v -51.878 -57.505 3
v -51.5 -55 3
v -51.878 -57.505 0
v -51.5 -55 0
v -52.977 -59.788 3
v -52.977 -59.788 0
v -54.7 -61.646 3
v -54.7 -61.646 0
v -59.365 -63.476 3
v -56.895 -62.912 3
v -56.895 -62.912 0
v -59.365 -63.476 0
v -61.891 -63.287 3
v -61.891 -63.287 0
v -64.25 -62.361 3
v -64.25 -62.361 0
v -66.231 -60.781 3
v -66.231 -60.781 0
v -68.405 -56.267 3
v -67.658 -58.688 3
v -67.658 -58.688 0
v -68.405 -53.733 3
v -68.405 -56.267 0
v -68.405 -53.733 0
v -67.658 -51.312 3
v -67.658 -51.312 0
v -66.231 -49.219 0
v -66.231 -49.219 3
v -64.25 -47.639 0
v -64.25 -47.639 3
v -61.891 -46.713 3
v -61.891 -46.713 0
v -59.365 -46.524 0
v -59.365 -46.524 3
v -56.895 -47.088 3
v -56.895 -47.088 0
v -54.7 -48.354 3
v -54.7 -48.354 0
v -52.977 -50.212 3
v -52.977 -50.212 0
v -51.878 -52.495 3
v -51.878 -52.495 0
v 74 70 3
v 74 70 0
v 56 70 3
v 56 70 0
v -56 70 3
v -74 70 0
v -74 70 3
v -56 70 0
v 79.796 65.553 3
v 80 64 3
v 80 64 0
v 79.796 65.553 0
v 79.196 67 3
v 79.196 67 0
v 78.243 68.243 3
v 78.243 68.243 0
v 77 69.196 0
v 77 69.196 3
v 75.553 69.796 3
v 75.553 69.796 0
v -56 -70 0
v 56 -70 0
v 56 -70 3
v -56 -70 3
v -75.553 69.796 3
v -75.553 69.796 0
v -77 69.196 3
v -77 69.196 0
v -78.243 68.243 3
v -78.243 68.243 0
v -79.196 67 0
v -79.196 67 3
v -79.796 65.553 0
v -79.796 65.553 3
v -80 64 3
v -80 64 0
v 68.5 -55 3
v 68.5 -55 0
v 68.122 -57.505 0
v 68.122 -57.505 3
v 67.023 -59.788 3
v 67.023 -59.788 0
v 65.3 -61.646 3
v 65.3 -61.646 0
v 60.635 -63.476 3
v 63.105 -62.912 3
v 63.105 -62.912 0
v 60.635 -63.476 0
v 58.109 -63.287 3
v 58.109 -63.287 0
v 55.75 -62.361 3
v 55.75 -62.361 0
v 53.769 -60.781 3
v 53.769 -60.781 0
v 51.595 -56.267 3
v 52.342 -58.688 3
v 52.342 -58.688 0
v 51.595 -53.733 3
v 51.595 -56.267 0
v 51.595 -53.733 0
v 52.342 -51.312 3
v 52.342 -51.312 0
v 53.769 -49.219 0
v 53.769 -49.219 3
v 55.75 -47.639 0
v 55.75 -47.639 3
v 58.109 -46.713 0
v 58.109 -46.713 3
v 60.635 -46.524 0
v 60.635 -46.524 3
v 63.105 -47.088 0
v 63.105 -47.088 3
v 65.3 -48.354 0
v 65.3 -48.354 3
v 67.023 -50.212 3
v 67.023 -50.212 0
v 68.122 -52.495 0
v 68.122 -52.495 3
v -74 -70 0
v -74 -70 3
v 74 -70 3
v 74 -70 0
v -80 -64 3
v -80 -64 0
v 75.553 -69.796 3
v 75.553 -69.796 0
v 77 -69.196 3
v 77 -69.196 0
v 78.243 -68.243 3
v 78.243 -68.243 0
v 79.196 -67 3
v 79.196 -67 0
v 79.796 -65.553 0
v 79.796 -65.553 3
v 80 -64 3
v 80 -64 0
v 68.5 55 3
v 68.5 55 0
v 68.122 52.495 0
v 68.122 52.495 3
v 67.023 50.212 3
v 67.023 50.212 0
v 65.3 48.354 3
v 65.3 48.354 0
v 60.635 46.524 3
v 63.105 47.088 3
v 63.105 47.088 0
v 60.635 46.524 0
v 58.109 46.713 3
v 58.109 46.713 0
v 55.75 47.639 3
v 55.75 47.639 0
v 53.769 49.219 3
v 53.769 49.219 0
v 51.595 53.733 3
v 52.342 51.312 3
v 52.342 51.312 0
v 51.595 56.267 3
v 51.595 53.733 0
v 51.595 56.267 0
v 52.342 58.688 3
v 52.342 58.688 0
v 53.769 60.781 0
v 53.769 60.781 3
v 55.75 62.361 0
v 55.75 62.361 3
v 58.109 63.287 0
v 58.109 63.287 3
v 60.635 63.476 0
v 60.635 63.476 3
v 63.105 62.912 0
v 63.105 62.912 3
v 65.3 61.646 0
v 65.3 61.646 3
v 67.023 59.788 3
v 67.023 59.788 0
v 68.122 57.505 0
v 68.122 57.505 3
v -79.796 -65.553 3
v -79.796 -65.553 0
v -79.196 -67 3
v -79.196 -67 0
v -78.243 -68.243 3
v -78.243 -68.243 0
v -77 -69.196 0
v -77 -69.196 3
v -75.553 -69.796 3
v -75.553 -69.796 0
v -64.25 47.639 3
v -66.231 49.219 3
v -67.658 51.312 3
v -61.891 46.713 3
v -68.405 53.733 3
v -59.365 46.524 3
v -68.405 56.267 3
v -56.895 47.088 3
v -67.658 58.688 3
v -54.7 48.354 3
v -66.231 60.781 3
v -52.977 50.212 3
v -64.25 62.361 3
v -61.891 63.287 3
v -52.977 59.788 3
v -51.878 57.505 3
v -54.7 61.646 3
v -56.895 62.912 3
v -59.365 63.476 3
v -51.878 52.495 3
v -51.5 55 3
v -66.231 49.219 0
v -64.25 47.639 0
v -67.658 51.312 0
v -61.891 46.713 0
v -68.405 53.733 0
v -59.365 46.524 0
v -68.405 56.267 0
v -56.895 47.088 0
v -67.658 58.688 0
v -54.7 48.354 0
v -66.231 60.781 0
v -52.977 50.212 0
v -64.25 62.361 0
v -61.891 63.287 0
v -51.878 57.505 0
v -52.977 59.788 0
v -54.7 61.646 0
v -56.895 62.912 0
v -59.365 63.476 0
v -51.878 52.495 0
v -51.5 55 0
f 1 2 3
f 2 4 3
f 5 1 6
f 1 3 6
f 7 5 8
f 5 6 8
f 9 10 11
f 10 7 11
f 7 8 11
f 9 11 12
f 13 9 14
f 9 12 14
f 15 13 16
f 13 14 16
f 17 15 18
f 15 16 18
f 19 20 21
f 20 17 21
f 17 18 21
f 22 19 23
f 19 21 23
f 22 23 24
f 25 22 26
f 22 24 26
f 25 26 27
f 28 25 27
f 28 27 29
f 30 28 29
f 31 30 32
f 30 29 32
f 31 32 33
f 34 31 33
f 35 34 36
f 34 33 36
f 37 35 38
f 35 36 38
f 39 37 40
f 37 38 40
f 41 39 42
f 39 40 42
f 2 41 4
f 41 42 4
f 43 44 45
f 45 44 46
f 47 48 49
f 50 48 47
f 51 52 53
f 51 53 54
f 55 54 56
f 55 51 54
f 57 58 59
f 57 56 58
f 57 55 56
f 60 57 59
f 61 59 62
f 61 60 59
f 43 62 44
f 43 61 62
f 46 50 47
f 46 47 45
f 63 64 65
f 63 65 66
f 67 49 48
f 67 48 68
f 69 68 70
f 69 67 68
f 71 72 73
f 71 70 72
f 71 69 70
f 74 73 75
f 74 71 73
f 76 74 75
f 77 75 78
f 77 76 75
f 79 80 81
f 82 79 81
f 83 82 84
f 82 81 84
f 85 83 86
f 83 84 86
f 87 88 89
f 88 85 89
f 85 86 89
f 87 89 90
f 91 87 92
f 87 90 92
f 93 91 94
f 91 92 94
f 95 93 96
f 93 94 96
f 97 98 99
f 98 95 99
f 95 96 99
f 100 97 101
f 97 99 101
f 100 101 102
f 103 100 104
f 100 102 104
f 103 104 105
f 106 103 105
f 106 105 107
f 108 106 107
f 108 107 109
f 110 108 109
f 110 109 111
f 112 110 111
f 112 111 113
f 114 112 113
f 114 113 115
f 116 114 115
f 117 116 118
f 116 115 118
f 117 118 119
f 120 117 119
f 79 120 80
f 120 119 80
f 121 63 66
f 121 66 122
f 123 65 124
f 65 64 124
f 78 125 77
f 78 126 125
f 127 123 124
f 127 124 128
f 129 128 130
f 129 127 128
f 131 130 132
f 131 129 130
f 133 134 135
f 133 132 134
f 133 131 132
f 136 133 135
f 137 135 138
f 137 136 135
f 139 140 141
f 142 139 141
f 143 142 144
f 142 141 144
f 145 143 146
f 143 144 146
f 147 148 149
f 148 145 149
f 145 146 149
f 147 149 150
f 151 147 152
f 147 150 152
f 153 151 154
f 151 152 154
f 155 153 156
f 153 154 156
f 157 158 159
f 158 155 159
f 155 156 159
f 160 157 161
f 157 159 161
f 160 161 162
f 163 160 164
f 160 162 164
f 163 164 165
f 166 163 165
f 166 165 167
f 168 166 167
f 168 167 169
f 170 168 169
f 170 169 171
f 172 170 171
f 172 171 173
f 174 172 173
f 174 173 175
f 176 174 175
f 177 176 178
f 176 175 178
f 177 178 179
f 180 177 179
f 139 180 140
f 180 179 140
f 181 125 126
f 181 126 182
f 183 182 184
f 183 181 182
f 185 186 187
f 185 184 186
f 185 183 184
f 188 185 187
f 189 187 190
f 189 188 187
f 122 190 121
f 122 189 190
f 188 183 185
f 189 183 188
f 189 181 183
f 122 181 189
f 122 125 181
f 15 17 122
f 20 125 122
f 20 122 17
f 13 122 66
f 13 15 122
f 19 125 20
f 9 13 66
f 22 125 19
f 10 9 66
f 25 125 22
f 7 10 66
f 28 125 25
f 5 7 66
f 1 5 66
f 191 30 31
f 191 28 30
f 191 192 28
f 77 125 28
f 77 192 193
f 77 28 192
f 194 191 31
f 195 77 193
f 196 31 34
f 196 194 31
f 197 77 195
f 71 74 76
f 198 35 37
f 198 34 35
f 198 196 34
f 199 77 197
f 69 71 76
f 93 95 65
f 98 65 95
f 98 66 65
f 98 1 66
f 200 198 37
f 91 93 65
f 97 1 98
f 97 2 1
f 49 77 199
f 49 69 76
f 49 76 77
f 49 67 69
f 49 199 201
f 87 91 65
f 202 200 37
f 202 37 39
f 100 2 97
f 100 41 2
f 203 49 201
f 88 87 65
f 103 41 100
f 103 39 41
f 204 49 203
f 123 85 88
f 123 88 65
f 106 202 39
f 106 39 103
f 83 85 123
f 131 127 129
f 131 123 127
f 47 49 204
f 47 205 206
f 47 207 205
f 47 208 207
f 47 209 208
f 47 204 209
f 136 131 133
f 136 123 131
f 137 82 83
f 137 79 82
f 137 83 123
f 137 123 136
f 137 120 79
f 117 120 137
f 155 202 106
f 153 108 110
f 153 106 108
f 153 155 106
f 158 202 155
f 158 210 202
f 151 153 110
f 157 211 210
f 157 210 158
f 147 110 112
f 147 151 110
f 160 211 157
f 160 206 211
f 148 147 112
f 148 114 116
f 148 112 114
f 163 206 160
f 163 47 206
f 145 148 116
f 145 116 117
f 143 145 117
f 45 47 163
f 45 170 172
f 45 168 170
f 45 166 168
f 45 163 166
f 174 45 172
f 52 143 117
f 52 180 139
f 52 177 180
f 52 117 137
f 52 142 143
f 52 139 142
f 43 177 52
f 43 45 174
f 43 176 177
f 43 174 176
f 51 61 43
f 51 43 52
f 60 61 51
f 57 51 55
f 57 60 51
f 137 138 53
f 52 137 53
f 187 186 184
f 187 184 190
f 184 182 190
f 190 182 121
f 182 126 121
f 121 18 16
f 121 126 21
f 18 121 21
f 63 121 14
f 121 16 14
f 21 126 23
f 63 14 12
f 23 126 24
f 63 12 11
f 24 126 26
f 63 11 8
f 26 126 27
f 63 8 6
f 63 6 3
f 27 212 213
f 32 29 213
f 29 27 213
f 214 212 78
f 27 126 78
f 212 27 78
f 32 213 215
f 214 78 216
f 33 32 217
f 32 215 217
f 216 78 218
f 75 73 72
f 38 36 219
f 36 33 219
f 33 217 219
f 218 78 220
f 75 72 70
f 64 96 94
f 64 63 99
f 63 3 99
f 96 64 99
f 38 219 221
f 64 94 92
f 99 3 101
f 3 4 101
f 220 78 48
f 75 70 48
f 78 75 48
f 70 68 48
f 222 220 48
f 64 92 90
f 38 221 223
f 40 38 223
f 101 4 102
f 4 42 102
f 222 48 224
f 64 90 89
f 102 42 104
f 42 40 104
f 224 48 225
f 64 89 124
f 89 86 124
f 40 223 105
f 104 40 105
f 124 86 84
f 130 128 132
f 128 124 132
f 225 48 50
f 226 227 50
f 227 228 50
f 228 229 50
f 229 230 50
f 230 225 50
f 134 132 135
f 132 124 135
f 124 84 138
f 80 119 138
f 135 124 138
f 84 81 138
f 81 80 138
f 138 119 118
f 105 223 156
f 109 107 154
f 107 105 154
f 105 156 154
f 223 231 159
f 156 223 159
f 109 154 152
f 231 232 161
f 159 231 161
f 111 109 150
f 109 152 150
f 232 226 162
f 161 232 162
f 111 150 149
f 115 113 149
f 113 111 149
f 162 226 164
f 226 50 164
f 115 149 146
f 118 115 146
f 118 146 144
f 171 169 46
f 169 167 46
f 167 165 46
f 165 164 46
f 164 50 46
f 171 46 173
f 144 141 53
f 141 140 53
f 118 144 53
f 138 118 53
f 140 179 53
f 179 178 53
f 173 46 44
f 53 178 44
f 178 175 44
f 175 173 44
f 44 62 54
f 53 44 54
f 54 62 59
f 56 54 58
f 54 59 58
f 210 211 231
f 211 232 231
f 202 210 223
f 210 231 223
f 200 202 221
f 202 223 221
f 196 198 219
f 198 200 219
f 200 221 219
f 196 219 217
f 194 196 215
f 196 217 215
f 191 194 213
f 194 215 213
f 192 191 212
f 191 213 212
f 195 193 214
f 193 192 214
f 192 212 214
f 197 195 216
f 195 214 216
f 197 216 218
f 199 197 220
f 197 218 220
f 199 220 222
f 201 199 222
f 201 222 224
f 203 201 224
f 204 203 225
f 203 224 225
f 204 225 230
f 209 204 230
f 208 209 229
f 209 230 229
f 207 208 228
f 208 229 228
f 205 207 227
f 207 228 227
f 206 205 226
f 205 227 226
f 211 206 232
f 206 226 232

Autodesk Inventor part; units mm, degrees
ref_plane "YZ Plane" through (0, 0, 0) normal (1, 0, 0) x (0, 1, 0)
ref_plane "XZ Plane" through (0, 0, 0) normal (0, 1, 0) x (-1, 0, 0)
ref_plane "XY Plane" through (0, 0, 0) normal (0, 0, 1) x (1, 0, 0)
sketch3d "3D Sketch1"
sketch "Sketch1" plane through (0, 0, 0) normal (0, 0, 1) x (1, 0, 0)
  line L0 (-56, 70) -> (56, 70)
  line L1 (56, 70) -> (56, -70) construction
  line L2 (56, -70) -> (-56, -70)
  line L3 (-56, -70) -> (-56, 70) construction
  line L4 (-56, 70) -> (56, -70) construction
  line L5 (56, 70) -> (-56, -70) construction
  line L6 (56, -70) -> (80, -70)
  line L7 (80, -70) -> (80, 70)
  line L8 (80, 70) -> (56, 70)
  line L9 (-56, -70) -> (-80, -70)
  line L10 (-80, -70) -> (-80, 70)
  line L11 (-80, 70) -> (-56, 70)
  circle A0 centre (60, -55) radius 8.5
  circle A1 centre (60, 55) radius 8.5
  circle A2 centre (-60, -55) radius 8.5
  circle A3 centre (-60, 55) radius 8.5
  line L12 (0, -70) -> (0, 70) construction
  line L13 (80, 0) -> (-80, 0) construction
  point P0 (0, 0)
  dimension "d30" = 140
  dimension "d34" = 160
  dimension "d35" = 17
  dimension "d36" = 20
  dimension "d37" = 15
extrude "Plate1" add sketch "Sketch1" along normal blind 3
fillet "Corner Round1" radius 6 4 edges at (80, 70, 1.5) (-80, 70, 1.5) (-80, -70, 1.5) (80, -70, 1.5)
equation "\"d6\" = Thickness"
equation "\"BendReliefWidth\" = Thickness"
equation "\"BendReliefDepth\" = 0.5 * Thickness"
equation "\"CornerReliefSize\" = 4 * Thickness"
equation "\"MinimumRemnant\" = 2 * Thickness"
equation "\"TransitionRadius\" = BendRadius"
equation "\"JacobiRadiusSize\" = BendRadius"
equation "\"GapSize\" = Thickness"
equation "\"Thickness\" = 3"
equation "\"BendRadius\" = 5"
properties part number "MSC 081 pillar 1" material "Stainless Steel"
